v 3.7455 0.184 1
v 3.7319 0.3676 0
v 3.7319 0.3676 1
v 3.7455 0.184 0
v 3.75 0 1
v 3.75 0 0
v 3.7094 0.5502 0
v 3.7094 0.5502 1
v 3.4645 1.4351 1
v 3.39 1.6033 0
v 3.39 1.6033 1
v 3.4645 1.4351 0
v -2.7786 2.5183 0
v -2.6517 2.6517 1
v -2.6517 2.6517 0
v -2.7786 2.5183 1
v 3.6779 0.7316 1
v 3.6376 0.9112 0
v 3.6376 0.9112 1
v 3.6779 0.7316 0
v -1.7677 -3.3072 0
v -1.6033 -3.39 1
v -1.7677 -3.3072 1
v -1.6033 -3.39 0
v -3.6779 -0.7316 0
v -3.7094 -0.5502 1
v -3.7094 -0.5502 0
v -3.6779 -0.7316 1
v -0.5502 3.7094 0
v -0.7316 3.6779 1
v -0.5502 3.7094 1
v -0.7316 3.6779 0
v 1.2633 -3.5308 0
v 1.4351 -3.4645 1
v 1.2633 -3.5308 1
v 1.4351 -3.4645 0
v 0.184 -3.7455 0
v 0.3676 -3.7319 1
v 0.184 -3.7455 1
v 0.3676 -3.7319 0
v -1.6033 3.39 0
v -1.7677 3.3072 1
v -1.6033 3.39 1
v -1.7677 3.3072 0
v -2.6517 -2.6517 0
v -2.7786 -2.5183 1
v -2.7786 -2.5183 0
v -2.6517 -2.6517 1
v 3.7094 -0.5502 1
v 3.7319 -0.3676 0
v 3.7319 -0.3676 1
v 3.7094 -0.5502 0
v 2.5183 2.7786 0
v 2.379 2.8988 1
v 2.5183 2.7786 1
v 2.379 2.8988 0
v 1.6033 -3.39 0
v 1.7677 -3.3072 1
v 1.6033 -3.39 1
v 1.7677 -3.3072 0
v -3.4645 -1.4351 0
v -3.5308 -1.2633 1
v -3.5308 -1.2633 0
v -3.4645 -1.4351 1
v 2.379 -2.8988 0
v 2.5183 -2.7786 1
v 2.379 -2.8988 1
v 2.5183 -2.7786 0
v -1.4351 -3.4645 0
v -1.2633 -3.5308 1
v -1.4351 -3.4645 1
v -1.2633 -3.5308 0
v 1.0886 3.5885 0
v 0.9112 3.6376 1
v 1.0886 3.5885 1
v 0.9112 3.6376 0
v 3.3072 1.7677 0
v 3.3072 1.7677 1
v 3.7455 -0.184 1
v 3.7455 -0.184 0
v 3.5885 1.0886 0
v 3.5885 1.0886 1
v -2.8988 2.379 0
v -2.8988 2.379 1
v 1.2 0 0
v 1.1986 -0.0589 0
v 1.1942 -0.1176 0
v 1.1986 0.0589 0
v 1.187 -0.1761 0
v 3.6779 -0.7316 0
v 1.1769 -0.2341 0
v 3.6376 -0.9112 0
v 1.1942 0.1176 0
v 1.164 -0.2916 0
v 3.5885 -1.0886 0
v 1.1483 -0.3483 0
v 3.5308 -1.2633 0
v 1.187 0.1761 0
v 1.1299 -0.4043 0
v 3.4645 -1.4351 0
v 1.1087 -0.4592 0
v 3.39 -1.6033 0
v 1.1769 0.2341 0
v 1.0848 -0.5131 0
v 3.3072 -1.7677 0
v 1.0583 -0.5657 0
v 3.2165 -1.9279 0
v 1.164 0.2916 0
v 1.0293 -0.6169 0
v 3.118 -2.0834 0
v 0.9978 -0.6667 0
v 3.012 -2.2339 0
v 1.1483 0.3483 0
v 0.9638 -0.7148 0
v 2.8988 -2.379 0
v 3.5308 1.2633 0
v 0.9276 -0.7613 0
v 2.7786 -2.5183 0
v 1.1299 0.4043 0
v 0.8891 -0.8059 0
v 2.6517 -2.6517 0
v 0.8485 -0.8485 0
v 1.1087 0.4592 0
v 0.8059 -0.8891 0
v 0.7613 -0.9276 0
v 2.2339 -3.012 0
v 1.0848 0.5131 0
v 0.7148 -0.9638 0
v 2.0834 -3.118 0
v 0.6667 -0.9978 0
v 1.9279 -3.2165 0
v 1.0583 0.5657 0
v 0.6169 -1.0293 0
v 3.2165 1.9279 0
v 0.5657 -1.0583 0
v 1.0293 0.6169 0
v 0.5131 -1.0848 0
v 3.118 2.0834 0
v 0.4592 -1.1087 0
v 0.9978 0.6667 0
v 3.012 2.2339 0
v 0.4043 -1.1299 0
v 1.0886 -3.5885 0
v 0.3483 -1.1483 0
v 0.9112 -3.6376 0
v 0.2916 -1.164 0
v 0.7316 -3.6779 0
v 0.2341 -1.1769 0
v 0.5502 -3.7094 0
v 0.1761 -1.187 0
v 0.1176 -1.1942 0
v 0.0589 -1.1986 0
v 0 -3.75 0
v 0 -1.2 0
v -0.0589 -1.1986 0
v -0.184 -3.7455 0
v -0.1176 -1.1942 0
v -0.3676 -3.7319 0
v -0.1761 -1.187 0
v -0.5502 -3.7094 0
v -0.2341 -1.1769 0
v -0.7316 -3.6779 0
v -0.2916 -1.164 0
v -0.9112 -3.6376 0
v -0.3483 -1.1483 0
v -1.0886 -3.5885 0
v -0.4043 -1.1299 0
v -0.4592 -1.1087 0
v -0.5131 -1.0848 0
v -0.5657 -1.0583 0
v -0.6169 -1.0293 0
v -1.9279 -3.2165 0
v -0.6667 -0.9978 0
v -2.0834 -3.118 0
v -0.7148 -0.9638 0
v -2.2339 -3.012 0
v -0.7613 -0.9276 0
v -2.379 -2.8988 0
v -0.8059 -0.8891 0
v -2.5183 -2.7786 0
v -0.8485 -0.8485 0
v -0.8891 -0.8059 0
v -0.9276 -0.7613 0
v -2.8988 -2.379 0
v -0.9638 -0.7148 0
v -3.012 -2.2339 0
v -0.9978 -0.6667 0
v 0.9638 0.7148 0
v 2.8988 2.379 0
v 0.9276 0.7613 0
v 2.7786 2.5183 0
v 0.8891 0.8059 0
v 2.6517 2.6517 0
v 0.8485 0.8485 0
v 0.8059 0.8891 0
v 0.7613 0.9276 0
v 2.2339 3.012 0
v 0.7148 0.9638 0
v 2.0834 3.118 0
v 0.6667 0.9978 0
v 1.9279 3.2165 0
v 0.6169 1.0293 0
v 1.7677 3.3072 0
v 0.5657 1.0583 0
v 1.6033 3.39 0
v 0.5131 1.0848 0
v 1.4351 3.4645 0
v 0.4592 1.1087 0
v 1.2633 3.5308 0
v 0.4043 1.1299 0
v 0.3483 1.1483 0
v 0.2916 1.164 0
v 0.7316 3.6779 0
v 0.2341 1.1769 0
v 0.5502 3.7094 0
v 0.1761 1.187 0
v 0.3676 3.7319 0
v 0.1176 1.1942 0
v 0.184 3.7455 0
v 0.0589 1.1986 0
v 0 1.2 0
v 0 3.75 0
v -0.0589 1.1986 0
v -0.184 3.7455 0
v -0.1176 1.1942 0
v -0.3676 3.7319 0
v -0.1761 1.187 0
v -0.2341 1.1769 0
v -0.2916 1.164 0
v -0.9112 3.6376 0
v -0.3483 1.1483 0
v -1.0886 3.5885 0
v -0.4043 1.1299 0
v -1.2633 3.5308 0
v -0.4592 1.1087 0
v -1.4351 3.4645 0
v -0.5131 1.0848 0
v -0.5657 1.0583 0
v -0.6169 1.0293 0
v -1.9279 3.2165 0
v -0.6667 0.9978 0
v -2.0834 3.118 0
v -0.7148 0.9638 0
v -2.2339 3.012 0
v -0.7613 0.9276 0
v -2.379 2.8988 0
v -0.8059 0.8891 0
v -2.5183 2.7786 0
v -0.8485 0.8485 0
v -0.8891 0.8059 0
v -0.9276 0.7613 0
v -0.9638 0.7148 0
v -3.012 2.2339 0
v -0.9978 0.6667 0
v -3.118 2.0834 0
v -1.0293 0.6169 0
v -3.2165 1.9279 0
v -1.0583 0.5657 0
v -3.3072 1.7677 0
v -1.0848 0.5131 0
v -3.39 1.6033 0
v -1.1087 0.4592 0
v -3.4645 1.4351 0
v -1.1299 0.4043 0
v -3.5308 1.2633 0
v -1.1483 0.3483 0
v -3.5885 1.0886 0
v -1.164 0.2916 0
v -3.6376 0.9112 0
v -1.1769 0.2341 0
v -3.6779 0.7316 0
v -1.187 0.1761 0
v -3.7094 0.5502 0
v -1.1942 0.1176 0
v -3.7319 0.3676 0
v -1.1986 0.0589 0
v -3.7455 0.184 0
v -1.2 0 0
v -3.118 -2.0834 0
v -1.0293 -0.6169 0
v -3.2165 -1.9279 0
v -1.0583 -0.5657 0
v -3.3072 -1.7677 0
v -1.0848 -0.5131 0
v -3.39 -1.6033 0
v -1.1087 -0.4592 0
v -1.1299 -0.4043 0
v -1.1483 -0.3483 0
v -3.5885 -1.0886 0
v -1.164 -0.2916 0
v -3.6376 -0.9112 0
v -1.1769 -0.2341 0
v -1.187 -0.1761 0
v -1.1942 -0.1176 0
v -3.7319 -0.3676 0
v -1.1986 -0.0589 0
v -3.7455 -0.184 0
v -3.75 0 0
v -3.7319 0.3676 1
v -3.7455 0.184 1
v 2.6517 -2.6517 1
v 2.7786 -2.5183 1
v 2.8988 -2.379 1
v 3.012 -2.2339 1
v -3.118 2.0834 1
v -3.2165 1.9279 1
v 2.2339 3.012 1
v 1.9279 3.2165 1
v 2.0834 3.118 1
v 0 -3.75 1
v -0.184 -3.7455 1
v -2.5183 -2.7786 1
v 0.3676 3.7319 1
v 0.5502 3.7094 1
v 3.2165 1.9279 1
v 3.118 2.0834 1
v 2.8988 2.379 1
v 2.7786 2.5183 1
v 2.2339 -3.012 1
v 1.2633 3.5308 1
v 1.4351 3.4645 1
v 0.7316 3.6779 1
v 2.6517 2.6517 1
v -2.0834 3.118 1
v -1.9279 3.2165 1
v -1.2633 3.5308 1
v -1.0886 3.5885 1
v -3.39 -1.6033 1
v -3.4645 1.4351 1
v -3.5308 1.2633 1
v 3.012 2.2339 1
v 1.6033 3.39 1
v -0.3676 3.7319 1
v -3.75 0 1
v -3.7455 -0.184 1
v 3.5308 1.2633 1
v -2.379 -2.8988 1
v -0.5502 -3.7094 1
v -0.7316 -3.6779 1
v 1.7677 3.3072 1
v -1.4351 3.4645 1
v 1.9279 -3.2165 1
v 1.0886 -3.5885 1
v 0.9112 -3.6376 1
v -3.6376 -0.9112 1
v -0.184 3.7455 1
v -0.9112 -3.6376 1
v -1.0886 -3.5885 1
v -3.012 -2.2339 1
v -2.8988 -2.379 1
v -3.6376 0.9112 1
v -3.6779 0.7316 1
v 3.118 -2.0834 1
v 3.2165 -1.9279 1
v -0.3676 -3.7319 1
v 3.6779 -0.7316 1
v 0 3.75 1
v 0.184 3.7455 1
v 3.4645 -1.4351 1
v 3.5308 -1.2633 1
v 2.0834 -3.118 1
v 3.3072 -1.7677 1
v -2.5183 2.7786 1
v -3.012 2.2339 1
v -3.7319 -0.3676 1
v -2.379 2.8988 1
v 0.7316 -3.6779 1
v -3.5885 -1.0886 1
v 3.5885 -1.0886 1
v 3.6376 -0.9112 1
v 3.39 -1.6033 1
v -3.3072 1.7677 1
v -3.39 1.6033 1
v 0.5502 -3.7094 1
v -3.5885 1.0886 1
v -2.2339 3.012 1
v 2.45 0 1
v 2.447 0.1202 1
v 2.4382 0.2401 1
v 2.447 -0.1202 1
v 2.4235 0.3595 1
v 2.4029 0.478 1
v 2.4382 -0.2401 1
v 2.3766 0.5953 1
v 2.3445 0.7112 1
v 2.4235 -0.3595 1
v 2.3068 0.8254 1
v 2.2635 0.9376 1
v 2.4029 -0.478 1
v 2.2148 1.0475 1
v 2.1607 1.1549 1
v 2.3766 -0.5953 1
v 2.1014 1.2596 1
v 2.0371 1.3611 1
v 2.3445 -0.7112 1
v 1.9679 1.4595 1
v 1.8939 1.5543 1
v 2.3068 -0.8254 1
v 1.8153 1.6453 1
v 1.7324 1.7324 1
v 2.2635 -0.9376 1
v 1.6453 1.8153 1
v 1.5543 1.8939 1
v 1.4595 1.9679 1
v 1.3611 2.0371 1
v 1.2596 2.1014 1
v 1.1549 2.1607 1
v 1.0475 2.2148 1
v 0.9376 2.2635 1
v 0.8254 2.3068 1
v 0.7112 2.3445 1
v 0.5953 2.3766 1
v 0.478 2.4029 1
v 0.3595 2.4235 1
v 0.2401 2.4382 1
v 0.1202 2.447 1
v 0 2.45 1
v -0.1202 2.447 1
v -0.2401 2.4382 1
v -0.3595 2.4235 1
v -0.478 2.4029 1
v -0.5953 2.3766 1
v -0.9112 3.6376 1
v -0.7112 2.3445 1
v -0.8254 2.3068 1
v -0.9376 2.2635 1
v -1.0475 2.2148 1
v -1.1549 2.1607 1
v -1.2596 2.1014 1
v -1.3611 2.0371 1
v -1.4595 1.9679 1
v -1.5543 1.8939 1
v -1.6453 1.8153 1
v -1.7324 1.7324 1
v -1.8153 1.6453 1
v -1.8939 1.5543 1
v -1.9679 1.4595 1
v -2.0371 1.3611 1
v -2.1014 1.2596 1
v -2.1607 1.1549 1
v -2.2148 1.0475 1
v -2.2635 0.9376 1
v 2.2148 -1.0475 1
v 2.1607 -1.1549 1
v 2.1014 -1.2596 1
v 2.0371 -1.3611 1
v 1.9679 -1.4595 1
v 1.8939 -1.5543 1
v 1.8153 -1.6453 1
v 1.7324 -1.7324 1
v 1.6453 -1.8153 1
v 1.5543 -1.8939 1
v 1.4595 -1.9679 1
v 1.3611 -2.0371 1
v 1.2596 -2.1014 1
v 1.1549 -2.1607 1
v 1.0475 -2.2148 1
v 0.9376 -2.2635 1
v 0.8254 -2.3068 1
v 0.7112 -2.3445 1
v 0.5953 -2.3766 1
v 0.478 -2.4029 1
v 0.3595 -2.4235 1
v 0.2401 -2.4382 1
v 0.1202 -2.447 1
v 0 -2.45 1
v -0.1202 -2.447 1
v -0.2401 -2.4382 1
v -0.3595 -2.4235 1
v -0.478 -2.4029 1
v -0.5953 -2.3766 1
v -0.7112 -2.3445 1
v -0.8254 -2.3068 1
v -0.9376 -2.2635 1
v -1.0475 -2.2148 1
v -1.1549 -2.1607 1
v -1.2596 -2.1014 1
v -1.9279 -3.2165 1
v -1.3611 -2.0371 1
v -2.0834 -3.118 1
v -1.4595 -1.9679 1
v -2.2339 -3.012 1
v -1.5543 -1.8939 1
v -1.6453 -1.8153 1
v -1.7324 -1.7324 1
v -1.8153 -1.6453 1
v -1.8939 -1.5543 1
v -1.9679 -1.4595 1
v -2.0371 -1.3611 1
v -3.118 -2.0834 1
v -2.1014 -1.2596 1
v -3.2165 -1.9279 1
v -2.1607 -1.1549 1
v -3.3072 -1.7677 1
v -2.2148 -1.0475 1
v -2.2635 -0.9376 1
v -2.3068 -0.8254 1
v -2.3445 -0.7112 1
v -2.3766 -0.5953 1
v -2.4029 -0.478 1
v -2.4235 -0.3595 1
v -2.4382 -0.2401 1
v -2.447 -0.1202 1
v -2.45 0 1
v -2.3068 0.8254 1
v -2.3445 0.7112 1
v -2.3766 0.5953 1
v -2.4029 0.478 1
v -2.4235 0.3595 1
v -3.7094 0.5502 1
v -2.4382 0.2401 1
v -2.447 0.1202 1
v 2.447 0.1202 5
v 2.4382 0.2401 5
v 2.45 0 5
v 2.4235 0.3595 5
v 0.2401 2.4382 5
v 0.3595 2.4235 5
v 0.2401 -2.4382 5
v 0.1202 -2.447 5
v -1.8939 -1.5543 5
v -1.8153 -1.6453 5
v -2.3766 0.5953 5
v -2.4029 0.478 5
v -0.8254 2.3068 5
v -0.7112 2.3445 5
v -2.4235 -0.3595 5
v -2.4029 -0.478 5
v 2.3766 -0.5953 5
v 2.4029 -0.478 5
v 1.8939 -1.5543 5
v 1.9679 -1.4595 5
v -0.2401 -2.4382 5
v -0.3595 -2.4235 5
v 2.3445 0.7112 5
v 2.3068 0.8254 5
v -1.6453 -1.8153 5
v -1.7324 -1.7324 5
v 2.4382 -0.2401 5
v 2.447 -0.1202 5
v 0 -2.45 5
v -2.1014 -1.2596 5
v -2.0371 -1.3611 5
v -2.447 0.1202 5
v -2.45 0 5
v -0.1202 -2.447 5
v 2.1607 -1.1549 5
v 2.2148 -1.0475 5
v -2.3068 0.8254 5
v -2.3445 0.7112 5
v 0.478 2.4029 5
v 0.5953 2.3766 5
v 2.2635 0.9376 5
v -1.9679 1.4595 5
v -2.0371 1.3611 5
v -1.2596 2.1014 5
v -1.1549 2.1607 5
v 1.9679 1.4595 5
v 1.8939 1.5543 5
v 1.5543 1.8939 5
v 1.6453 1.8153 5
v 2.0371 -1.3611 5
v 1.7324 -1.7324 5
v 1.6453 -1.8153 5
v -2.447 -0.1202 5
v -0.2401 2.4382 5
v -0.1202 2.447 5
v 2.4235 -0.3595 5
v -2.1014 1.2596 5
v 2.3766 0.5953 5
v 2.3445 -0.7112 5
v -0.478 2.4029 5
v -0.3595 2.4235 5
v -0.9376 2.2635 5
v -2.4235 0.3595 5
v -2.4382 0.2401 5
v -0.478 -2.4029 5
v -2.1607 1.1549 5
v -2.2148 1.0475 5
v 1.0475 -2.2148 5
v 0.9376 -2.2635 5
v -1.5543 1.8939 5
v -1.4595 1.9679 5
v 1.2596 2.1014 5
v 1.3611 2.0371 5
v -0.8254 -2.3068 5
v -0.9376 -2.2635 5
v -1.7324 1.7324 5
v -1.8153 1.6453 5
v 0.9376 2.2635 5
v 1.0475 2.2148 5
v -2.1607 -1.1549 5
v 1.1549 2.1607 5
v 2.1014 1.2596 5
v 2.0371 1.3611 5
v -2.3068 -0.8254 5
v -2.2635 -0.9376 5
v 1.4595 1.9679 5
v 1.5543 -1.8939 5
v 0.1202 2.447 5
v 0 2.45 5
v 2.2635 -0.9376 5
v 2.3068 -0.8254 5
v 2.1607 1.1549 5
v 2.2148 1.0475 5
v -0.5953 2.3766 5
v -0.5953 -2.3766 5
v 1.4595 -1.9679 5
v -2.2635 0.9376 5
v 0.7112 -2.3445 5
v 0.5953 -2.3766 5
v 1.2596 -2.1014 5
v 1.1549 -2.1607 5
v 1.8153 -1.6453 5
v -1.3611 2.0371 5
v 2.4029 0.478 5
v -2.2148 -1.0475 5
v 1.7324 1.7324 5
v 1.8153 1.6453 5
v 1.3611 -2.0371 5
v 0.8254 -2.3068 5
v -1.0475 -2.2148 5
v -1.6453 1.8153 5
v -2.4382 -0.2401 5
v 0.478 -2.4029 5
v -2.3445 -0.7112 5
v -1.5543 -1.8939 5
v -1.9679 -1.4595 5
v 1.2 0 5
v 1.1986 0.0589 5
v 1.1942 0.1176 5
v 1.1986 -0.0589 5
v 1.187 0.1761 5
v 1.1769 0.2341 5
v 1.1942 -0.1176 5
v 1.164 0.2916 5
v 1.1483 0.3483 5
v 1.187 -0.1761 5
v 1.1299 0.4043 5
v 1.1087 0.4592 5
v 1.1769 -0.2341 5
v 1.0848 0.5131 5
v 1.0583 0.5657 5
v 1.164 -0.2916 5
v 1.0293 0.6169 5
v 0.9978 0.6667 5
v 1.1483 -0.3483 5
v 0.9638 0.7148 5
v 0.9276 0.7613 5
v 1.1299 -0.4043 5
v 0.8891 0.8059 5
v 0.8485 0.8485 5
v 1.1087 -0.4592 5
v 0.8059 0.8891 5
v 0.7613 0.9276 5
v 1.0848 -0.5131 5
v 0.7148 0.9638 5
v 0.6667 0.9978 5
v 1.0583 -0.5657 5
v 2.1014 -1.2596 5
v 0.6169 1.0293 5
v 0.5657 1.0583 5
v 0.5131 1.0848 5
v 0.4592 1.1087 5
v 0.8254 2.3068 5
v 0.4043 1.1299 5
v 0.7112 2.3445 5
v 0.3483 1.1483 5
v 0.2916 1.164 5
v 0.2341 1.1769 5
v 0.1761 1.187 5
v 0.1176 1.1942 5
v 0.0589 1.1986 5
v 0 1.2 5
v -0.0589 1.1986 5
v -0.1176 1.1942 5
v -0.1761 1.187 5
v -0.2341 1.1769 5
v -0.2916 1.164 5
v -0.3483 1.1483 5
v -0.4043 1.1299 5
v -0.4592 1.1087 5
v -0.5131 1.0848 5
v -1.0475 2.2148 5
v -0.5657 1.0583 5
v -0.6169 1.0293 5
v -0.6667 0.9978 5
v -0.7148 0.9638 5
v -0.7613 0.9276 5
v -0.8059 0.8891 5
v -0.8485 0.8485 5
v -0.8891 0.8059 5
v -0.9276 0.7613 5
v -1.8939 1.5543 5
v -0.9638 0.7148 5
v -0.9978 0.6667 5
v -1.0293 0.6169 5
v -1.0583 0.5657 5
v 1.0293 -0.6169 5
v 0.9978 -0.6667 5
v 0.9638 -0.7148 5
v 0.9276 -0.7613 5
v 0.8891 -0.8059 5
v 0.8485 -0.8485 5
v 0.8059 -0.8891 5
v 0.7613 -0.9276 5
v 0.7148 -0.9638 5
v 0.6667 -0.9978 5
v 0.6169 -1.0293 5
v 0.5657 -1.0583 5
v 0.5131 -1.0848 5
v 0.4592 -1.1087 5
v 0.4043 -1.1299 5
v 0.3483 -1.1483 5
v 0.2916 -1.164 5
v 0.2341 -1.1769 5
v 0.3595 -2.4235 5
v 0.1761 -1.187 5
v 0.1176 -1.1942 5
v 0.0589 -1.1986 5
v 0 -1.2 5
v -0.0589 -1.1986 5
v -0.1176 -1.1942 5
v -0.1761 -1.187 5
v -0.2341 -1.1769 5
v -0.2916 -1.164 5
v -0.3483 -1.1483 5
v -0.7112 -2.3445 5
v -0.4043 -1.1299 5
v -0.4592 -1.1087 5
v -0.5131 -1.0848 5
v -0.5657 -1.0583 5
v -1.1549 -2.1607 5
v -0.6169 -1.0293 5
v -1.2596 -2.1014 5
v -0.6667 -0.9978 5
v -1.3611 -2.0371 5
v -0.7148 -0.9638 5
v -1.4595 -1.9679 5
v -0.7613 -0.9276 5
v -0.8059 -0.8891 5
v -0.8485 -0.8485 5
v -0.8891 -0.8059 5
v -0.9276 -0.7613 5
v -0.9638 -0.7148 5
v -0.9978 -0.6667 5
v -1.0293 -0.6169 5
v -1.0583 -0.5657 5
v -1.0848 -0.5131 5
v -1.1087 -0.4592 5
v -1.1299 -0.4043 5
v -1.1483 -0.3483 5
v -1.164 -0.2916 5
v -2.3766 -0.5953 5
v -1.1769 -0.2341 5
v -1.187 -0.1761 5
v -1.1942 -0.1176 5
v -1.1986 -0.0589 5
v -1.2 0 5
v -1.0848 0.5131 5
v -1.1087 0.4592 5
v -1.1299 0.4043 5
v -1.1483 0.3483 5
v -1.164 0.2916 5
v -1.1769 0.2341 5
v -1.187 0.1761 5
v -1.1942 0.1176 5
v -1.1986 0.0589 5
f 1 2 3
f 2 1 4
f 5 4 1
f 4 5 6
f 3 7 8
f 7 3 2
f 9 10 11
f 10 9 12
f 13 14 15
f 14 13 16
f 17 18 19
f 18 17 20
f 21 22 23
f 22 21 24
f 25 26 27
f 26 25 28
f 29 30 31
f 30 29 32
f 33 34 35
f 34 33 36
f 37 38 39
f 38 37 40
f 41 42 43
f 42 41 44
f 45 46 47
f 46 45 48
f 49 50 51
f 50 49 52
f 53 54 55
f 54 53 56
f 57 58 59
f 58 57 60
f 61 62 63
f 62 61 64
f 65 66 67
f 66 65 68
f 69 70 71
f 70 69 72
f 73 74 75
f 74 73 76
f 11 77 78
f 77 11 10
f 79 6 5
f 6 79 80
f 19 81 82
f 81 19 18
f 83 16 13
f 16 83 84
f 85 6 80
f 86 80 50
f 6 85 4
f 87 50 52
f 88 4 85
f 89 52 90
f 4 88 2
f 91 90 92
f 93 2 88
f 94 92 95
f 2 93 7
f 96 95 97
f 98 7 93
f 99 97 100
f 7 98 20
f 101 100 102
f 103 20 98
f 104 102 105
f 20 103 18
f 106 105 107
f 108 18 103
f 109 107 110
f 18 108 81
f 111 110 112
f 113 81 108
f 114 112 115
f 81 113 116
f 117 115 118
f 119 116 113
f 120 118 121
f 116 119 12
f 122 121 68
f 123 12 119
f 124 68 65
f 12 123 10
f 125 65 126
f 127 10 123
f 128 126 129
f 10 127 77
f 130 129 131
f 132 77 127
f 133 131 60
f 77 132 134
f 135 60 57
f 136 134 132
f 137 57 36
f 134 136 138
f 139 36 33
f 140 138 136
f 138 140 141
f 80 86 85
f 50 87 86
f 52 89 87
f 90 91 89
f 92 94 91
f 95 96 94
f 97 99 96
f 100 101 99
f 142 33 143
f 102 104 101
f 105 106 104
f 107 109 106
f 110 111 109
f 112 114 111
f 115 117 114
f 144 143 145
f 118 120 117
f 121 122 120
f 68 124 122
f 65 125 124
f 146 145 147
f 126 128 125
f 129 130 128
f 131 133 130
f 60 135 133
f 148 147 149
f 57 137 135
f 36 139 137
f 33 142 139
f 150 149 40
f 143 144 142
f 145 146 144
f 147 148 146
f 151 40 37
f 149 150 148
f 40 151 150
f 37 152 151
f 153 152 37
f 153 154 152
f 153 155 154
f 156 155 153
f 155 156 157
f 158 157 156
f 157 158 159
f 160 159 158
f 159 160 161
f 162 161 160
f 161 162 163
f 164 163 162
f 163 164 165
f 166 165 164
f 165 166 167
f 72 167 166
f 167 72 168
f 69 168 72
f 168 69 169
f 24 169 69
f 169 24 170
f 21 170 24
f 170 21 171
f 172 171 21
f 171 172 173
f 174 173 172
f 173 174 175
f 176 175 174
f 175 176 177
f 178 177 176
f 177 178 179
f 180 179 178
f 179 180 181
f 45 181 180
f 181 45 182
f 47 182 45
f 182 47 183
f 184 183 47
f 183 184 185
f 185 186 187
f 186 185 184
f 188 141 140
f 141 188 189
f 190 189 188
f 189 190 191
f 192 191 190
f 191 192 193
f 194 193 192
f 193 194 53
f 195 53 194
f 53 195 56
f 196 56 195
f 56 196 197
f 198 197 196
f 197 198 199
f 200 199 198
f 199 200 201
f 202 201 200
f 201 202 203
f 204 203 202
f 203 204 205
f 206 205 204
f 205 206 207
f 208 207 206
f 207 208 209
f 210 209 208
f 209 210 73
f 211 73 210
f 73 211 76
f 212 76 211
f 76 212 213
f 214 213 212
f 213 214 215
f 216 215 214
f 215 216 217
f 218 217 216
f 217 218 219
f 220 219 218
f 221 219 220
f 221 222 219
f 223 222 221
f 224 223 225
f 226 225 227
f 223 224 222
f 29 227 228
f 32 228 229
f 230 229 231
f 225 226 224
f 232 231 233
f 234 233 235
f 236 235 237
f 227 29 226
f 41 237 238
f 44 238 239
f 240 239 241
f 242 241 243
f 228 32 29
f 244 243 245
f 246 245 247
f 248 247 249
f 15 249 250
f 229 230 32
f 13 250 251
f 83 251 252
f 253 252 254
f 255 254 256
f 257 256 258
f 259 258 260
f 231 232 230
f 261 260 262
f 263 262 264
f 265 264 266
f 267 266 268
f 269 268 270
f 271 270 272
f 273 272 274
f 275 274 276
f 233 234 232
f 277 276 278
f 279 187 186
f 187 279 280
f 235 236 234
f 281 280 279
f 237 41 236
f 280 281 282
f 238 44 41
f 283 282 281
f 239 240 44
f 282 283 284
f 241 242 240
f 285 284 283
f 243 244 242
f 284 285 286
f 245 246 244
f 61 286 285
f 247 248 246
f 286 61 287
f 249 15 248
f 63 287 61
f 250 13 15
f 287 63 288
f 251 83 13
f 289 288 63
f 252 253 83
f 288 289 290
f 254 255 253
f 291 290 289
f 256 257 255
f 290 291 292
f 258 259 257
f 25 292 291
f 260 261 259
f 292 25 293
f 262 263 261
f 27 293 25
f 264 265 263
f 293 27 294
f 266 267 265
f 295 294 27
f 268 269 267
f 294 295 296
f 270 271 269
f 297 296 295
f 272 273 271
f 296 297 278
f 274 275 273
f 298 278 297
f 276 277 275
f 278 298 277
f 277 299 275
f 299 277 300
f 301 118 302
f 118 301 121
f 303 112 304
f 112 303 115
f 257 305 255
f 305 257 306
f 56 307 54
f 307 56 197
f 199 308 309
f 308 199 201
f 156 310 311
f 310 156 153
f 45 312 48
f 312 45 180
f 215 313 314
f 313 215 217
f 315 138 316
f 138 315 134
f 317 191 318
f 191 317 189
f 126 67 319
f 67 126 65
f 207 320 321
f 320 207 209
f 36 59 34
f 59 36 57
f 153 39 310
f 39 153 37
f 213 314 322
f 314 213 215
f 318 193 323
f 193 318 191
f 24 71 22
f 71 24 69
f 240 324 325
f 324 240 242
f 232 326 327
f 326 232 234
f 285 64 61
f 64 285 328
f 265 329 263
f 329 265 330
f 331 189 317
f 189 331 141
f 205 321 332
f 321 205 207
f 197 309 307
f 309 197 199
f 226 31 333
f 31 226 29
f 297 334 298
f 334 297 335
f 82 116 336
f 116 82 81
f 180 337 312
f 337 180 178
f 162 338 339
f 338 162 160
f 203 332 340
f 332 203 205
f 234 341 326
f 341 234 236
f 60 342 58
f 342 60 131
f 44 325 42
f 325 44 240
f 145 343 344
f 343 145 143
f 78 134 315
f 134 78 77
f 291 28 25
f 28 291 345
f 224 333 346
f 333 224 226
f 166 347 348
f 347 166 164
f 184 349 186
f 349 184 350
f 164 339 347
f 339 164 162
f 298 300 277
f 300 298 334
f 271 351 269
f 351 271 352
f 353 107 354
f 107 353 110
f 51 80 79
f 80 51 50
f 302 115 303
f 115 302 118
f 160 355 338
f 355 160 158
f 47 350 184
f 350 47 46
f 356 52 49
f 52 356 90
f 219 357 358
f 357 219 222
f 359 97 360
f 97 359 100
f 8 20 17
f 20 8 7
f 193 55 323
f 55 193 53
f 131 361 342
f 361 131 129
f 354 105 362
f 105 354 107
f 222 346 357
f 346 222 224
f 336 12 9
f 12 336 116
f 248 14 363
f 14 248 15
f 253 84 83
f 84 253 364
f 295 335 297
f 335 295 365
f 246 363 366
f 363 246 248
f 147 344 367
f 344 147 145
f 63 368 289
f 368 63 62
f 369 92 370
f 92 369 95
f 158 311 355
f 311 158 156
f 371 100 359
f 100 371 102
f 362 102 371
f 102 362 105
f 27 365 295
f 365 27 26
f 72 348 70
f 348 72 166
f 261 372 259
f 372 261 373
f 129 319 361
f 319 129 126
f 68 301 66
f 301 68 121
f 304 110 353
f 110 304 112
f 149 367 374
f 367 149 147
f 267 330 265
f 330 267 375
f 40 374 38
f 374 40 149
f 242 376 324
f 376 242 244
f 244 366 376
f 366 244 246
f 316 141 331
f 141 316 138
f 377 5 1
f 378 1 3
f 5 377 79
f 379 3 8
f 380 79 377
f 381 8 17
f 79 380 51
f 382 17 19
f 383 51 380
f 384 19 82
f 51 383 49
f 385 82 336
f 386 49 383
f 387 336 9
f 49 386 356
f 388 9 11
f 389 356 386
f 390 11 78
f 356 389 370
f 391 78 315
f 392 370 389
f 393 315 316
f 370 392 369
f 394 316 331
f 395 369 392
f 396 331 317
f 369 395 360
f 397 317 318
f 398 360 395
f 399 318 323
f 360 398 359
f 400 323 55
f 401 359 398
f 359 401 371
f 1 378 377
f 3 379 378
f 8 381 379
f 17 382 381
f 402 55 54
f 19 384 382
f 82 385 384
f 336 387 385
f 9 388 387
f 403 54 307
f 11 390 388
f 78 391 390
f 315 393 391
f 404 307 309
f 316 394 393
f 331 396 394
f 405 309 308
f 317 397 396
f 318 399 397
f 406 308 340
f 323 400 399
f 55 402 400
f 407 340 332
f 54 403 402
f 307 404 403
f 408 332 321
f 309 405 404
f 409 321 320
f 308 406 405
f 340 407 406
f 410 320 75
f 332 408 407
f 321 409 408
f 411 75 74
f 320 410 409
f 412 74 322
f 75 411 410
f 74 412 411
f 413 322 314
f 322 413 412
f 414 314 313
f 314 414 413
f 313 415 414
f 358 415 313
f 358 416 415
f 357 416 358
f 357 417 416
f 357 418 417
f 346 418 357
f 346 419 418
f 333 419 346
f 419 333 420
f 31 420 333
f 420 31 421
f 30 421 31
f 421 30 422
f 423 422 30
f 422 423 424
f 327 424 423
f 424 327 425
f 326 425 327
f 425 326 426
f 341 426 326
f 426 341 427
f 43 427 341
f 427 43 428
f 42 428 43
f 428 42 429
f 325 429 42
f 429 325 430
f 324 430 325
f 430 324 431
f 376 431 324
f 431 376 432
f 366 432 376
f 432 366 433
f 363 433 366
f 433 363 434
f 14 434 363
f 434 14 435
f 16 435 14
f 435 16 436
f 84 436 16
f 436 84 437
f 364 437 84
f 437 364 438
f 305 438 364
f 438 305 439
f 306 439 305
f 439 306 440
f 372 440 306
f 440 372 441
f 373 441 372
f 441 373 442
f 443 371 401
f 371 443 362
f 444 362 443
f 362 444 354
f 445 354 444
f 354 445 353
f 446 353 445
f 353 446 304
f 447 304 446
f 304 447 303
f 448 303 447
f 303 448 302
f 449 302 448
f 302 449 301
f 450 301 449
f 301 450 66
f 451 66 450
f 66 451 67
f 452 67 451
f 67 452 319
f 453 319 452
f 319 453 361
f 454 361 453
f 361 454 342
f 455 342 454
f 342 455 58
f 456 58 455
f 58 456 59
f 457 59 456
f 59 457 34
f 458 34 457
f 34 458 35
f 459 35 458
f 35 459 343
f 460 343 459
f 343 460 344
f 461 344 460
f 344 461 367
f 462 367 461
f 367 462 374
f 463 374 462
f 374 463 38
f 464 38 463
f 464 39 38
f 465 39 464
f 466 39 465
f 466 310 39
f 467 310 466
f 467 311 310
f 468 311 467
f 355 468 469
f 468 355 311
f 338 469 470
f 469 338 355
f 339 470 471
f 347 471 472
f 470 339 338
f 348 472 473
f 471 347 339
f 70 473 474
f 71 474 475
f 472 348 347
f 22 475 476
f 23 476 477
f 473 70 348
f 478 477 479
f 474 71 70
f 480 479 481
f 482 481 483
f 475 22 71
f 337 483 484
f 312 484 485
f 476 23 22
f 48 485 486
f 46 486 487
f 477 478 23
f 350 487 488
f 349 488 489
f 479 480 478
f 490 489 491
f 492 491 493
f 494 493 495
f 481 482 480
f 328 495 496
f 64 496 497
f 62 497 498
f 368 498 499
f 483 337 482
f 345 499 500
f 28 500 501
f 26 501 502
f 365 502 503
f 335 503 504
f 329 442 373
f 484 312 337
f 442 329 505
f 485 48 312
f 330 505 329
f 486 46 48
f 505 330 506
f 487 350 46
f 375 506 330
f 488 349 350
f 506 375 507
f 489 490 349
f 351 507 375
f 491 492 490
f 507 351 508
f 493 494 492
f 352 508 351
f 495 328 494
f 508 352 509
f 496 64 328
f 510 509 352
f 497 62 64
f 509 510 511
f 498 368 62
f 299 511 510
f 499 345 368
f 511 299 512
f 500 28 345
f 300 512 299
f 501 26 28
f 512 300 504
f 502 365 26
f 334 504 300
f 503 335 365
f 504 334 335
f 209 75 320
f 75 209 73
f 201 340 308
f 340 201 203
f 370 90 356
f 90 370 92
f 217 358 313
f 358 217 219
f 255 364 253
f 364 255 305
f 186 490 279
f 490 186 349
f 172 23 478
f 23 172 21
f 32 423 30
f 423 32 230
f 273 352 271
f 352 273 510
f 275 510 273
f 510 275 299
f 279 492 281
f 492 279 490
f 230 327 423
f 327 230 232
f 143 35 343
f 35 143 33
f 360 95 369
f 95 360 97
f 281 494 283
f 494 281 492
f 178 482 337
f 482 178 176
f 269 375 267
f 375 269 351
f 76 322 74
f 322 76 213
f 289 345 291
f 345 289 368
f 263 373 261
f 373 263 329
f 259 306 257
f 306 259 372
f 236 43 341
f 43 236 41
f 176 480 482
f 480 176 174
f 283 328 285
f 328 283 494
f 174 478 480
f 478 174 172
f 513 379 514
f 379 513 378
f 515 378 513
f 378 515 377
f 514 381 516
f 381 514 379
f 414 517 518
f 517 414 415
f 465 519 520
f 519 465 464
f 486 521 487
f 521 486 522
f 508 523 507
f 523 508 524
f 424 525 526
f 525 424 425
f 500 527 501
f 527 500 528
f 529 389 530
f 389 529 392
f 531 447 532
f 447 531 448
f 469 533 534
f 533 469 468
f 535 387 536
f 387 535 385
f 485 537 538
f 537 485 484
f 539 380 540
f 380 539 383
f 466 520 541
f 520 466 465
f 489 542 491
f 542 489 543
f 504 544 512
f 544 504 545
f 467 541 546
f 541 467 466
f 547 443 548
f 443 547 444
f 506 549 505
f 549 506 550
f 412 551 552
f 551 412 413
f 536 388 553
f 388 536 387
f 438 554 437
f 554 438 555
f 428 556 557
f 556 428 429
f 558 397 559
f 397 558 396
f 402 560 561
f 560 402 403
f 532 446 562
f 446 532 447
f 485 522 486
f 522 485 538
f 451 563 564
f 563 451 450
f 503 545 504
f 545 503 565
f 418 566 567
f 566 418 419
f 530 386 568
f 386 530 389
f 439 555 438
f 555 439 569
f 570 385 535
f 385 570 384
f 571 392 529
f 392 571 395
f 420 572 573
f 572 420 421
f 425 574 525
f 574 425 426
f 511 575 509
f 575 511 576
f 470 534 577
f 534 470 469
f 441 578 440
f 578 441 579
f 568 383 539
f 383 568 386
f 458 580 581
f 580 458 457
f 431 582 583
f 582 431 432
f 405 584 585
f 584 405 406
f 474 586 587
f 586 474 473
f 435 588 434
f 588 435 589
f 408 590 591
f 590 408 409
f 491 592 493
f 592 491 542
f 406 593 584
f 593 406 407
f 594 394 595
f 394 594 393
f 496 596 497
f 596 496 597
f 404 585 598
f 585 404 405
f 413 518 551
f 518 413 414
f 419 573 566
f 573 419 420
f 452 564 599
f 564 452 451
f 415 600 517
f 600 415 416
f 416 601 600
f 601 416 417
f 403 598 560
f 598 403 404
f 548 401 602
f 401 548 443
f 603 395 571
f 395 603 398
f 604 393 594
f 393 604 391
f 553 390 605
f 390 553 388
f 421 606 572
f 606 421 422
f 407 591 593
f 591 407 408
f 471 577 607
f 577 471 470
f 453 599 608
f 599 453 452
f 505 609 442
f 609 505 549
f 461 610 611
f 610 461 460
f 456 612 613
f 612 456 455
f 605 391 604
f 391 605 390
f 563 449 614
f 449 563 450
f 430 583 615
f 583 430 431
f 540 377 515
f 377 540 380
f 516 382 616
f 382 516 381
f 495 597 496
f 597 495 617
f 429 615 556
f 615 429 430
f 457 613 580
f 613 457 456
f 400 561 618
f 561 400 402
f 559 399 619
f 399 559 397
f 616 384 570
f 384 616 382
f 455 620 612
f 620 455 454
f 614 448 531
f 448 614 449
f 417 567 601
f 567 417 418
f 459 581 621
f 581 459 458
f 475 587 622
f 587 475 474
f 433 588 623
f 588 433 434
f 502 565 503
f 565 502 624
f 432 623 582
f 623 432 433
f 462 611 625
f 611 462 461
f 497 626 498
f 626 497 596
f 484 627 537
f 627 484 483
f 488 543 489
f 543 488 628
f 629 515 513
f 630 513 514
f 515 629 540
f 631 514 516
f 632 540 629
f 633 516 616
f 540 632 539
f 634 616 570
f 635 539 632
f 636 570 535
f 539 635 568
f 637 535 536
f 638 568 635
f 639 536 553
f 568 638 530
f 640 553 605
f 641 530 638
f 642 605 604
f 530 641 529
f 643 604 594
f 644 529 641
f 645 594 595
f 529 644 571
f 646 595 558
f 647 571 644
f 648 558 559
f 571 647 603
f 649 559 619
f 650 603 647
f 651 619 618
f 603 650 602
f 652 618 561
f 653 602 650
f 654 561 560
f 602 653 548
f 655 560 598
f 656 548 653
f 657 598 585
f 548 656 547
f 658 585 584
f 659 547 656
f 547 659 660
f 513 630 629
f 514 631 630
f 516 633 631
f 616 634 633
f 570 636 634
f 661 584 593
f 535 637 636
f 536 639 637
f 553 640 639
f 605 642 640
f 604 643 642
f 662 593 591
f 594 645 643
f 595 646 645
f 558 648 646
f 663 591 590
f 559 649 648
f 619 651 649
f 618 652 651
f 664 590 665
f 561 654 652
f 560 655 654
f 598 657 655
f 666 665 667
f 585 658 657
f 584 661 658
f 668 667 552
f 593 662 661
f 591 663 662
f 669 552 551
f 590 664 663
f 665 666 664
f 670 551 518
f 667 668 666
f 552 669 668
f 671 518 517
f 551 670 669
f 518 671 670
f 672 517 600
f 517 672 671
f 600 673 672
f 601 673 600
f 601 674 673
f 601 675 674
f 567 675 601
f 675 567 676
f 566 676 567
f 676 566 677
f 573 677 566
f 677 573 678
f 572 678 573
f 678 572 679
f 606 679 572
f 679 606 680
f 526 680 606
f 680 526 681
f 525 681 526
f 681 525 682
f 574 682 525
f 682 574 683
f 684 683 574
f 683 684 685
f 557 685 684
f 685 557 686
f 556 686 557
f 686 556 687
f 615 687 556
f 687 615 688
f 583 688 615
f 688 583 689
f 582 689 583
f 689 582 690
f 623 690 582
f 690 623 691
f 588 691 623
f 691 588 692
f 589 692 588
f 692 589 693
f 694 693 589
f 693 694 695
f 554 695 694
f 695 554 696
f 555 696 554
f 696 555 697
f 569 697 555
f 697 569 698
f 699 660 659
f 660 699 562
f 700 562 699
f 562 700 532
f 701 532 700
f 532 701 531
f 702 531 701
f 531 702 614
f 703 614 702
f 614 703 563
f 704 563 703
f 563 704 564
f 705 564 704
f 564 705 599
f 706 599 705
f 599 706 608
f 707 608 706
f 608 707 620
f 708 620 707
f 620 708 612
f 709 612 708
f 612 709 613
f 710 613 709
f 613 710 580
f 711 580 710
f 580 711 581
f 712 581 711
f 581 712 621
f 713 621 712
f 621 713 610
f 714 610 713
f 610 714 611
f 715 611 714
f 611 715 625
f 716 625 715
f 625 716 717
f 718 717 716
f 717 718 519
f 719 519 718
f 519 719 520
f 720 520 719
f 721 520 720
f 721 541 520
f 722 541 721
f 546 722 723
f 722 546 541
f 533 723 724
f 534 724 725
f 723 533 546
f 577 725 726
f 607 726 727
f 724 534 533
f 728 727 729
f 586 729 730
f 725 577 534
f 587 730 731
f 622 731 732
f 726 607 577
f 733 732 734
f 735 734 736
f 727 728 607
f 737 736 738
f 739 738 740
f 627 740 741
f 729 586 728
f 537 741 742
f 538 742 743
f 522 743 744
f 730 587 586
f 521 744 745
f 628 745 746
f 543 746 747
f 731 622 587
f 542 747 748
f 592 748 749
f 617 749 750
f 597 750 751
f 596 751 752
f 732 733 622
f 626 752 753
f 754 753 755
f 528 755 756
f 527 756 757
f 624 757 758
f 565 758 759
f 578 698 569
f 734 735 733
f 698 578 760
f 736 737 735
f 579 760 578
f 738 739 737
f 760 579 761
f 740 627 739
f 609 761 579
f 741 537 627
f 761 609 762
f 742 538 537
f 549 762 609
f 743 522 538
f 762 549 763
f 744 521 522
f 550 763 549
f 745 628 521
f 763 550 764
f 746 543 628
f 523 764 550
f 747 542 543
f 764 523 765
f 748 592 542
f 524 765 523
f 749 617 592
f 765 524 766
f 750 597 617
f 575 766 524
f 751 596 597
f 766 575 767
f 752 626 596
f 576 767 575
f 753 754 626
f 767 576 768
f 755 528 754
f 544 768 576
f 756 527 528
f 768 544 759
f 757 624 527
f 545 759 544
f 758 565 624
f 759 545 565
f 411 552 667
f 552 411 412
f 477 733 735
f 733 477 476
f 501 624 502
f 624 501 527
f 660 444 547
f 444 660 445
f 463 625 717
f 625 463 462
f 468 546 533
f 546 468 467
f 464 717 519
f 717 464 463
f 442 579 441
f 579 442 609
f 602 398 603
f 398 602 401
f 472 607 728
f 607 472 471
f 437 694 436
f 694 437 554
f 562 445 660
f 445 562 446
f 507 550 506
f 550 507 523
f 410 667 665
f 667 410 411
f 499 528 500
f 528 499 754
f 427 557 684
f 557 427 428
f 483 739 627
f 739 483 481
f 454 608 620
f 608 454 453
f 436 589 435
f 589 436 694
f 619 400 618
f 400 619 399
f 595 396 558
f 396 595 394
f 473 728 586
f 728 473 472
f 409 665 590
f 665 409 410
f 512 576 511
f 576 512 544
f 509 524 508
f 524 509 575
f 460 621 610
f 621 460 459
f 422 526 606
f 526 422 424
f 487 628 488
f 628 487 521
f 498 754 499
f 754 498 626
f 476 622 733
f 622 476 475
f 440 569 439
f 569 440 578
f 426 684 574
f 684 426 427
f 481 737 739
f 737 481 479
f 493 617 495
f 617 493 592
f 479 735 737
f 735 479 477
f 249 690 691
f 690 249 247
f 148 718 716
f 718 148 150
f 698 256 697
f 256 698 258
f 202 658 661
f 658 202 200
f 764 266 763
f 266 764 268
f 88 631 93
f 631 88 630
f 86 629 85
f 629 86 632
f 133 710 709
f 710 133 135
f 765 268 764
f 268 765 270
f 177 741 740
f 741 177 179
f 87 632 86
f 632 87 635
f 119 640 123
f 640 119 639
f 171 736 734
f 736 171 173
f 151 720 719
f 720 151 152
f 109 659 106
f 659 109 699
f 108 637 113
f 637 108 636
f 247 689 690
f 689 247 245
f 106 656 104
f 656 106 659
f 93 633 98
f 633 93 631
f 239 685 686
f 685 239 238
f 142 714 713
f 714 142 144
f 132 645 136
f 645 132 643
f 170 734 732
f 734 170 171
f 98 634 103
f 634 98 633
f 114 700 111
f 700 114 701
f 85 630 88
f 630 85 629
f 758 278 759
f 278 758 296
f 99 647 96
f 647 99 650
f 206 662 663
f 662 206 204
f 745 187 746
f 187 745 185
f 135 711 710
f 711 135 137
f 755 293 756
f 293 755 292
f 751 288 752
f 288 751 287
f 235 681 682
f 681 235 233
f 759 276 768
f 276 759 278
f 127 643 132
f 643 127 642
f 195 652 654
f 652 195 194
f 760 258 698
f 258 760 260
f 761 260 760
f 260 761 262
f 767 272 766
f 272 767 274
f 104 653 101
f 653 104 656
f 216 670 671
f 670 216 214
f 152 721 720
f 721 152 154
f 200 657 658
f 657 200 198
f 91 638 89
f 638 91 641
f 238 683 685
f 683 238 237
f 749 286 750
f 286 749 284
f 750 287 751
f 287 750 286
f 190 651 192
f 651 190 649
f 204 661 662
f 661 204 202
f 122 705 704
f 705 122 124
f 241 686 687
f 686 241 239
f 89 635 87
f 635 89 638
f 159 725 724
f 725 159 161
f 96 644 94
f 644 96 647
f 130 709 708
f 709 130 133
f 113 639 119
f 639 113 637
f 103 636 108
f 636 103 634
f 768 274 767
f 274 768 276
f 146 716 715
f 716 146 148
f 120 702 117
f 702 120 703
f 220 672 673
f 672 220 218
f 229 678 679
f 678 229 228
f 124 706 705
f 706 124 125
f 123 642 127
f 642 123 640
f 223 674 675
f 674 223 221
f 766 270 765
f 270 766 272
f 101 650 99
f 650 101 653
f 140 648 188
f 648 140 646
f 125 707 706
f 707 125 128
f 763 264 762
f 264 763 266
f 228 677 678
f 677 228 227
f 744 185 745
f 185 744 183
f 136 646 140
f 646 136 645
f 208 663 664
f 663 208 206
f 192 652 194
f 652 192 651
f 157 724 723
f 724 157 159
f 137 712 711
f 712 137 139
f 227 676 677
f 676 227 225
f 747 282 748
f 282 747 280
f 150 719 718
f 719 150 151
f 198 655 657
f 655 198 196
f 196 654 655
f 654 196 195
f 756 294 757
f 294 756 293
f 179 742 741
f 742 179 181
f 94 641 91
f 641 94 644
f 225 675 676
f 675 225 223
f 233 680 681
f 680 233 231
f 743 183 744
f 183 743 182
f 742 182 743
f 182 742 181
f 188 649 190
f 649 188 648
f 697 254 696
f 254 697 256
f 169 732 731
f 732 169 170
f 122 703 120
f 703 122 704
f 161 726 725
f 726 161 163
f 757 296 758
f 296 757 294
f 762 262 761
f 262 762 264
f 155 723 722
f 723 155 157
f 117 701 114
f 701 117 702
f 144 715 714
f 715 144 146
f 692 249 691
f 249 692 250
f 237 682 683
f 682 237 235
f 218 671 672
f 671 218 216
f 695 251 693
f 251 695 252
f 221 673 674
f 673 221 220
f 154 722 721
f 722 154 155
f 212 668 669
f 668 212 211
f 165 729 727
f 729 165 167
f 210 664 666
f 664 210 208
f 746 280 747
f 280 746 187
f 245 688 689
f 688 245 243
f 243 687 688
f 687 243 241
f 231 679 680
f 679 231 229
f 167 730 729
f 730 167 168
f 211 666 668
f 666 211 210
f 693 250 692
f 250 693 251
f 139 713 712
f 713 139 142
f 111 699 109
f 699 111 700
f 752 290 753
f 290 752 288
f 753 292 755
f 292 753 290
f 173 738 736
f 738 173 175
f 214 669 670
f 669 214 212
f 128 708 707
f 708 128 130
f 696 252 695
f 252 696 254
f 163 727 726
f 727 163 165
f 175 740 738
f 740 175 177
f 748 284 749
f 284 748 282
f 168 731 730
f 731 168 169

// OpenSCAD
plug_radius = 4.9 / 2.0;
plug_length = 4.0;
cap_radius = 7.5 / 2.0;
cap_height = 1.0;
cable_hole_radius = 1.2;
cable_hole_length = 20;
fn = 128;

module render()
{
  difference() {
    union() {
      cylinder(h=cap_height,
               r1=cap_radius,
               r2=cap_radius, $fn=fn);
      translate([0, 0, cap_height])
      cylinder(h=plug_length,
               r1=plug_radius,
               r2=plug_radius, $fn=fn);
    }
    cylinder(h=cable_hole_length,
             r1=cable_hole_radius,
             r2=cable_hole_radius, $fn=fn, center=true);
  }
}

echo(version=version());

render();
